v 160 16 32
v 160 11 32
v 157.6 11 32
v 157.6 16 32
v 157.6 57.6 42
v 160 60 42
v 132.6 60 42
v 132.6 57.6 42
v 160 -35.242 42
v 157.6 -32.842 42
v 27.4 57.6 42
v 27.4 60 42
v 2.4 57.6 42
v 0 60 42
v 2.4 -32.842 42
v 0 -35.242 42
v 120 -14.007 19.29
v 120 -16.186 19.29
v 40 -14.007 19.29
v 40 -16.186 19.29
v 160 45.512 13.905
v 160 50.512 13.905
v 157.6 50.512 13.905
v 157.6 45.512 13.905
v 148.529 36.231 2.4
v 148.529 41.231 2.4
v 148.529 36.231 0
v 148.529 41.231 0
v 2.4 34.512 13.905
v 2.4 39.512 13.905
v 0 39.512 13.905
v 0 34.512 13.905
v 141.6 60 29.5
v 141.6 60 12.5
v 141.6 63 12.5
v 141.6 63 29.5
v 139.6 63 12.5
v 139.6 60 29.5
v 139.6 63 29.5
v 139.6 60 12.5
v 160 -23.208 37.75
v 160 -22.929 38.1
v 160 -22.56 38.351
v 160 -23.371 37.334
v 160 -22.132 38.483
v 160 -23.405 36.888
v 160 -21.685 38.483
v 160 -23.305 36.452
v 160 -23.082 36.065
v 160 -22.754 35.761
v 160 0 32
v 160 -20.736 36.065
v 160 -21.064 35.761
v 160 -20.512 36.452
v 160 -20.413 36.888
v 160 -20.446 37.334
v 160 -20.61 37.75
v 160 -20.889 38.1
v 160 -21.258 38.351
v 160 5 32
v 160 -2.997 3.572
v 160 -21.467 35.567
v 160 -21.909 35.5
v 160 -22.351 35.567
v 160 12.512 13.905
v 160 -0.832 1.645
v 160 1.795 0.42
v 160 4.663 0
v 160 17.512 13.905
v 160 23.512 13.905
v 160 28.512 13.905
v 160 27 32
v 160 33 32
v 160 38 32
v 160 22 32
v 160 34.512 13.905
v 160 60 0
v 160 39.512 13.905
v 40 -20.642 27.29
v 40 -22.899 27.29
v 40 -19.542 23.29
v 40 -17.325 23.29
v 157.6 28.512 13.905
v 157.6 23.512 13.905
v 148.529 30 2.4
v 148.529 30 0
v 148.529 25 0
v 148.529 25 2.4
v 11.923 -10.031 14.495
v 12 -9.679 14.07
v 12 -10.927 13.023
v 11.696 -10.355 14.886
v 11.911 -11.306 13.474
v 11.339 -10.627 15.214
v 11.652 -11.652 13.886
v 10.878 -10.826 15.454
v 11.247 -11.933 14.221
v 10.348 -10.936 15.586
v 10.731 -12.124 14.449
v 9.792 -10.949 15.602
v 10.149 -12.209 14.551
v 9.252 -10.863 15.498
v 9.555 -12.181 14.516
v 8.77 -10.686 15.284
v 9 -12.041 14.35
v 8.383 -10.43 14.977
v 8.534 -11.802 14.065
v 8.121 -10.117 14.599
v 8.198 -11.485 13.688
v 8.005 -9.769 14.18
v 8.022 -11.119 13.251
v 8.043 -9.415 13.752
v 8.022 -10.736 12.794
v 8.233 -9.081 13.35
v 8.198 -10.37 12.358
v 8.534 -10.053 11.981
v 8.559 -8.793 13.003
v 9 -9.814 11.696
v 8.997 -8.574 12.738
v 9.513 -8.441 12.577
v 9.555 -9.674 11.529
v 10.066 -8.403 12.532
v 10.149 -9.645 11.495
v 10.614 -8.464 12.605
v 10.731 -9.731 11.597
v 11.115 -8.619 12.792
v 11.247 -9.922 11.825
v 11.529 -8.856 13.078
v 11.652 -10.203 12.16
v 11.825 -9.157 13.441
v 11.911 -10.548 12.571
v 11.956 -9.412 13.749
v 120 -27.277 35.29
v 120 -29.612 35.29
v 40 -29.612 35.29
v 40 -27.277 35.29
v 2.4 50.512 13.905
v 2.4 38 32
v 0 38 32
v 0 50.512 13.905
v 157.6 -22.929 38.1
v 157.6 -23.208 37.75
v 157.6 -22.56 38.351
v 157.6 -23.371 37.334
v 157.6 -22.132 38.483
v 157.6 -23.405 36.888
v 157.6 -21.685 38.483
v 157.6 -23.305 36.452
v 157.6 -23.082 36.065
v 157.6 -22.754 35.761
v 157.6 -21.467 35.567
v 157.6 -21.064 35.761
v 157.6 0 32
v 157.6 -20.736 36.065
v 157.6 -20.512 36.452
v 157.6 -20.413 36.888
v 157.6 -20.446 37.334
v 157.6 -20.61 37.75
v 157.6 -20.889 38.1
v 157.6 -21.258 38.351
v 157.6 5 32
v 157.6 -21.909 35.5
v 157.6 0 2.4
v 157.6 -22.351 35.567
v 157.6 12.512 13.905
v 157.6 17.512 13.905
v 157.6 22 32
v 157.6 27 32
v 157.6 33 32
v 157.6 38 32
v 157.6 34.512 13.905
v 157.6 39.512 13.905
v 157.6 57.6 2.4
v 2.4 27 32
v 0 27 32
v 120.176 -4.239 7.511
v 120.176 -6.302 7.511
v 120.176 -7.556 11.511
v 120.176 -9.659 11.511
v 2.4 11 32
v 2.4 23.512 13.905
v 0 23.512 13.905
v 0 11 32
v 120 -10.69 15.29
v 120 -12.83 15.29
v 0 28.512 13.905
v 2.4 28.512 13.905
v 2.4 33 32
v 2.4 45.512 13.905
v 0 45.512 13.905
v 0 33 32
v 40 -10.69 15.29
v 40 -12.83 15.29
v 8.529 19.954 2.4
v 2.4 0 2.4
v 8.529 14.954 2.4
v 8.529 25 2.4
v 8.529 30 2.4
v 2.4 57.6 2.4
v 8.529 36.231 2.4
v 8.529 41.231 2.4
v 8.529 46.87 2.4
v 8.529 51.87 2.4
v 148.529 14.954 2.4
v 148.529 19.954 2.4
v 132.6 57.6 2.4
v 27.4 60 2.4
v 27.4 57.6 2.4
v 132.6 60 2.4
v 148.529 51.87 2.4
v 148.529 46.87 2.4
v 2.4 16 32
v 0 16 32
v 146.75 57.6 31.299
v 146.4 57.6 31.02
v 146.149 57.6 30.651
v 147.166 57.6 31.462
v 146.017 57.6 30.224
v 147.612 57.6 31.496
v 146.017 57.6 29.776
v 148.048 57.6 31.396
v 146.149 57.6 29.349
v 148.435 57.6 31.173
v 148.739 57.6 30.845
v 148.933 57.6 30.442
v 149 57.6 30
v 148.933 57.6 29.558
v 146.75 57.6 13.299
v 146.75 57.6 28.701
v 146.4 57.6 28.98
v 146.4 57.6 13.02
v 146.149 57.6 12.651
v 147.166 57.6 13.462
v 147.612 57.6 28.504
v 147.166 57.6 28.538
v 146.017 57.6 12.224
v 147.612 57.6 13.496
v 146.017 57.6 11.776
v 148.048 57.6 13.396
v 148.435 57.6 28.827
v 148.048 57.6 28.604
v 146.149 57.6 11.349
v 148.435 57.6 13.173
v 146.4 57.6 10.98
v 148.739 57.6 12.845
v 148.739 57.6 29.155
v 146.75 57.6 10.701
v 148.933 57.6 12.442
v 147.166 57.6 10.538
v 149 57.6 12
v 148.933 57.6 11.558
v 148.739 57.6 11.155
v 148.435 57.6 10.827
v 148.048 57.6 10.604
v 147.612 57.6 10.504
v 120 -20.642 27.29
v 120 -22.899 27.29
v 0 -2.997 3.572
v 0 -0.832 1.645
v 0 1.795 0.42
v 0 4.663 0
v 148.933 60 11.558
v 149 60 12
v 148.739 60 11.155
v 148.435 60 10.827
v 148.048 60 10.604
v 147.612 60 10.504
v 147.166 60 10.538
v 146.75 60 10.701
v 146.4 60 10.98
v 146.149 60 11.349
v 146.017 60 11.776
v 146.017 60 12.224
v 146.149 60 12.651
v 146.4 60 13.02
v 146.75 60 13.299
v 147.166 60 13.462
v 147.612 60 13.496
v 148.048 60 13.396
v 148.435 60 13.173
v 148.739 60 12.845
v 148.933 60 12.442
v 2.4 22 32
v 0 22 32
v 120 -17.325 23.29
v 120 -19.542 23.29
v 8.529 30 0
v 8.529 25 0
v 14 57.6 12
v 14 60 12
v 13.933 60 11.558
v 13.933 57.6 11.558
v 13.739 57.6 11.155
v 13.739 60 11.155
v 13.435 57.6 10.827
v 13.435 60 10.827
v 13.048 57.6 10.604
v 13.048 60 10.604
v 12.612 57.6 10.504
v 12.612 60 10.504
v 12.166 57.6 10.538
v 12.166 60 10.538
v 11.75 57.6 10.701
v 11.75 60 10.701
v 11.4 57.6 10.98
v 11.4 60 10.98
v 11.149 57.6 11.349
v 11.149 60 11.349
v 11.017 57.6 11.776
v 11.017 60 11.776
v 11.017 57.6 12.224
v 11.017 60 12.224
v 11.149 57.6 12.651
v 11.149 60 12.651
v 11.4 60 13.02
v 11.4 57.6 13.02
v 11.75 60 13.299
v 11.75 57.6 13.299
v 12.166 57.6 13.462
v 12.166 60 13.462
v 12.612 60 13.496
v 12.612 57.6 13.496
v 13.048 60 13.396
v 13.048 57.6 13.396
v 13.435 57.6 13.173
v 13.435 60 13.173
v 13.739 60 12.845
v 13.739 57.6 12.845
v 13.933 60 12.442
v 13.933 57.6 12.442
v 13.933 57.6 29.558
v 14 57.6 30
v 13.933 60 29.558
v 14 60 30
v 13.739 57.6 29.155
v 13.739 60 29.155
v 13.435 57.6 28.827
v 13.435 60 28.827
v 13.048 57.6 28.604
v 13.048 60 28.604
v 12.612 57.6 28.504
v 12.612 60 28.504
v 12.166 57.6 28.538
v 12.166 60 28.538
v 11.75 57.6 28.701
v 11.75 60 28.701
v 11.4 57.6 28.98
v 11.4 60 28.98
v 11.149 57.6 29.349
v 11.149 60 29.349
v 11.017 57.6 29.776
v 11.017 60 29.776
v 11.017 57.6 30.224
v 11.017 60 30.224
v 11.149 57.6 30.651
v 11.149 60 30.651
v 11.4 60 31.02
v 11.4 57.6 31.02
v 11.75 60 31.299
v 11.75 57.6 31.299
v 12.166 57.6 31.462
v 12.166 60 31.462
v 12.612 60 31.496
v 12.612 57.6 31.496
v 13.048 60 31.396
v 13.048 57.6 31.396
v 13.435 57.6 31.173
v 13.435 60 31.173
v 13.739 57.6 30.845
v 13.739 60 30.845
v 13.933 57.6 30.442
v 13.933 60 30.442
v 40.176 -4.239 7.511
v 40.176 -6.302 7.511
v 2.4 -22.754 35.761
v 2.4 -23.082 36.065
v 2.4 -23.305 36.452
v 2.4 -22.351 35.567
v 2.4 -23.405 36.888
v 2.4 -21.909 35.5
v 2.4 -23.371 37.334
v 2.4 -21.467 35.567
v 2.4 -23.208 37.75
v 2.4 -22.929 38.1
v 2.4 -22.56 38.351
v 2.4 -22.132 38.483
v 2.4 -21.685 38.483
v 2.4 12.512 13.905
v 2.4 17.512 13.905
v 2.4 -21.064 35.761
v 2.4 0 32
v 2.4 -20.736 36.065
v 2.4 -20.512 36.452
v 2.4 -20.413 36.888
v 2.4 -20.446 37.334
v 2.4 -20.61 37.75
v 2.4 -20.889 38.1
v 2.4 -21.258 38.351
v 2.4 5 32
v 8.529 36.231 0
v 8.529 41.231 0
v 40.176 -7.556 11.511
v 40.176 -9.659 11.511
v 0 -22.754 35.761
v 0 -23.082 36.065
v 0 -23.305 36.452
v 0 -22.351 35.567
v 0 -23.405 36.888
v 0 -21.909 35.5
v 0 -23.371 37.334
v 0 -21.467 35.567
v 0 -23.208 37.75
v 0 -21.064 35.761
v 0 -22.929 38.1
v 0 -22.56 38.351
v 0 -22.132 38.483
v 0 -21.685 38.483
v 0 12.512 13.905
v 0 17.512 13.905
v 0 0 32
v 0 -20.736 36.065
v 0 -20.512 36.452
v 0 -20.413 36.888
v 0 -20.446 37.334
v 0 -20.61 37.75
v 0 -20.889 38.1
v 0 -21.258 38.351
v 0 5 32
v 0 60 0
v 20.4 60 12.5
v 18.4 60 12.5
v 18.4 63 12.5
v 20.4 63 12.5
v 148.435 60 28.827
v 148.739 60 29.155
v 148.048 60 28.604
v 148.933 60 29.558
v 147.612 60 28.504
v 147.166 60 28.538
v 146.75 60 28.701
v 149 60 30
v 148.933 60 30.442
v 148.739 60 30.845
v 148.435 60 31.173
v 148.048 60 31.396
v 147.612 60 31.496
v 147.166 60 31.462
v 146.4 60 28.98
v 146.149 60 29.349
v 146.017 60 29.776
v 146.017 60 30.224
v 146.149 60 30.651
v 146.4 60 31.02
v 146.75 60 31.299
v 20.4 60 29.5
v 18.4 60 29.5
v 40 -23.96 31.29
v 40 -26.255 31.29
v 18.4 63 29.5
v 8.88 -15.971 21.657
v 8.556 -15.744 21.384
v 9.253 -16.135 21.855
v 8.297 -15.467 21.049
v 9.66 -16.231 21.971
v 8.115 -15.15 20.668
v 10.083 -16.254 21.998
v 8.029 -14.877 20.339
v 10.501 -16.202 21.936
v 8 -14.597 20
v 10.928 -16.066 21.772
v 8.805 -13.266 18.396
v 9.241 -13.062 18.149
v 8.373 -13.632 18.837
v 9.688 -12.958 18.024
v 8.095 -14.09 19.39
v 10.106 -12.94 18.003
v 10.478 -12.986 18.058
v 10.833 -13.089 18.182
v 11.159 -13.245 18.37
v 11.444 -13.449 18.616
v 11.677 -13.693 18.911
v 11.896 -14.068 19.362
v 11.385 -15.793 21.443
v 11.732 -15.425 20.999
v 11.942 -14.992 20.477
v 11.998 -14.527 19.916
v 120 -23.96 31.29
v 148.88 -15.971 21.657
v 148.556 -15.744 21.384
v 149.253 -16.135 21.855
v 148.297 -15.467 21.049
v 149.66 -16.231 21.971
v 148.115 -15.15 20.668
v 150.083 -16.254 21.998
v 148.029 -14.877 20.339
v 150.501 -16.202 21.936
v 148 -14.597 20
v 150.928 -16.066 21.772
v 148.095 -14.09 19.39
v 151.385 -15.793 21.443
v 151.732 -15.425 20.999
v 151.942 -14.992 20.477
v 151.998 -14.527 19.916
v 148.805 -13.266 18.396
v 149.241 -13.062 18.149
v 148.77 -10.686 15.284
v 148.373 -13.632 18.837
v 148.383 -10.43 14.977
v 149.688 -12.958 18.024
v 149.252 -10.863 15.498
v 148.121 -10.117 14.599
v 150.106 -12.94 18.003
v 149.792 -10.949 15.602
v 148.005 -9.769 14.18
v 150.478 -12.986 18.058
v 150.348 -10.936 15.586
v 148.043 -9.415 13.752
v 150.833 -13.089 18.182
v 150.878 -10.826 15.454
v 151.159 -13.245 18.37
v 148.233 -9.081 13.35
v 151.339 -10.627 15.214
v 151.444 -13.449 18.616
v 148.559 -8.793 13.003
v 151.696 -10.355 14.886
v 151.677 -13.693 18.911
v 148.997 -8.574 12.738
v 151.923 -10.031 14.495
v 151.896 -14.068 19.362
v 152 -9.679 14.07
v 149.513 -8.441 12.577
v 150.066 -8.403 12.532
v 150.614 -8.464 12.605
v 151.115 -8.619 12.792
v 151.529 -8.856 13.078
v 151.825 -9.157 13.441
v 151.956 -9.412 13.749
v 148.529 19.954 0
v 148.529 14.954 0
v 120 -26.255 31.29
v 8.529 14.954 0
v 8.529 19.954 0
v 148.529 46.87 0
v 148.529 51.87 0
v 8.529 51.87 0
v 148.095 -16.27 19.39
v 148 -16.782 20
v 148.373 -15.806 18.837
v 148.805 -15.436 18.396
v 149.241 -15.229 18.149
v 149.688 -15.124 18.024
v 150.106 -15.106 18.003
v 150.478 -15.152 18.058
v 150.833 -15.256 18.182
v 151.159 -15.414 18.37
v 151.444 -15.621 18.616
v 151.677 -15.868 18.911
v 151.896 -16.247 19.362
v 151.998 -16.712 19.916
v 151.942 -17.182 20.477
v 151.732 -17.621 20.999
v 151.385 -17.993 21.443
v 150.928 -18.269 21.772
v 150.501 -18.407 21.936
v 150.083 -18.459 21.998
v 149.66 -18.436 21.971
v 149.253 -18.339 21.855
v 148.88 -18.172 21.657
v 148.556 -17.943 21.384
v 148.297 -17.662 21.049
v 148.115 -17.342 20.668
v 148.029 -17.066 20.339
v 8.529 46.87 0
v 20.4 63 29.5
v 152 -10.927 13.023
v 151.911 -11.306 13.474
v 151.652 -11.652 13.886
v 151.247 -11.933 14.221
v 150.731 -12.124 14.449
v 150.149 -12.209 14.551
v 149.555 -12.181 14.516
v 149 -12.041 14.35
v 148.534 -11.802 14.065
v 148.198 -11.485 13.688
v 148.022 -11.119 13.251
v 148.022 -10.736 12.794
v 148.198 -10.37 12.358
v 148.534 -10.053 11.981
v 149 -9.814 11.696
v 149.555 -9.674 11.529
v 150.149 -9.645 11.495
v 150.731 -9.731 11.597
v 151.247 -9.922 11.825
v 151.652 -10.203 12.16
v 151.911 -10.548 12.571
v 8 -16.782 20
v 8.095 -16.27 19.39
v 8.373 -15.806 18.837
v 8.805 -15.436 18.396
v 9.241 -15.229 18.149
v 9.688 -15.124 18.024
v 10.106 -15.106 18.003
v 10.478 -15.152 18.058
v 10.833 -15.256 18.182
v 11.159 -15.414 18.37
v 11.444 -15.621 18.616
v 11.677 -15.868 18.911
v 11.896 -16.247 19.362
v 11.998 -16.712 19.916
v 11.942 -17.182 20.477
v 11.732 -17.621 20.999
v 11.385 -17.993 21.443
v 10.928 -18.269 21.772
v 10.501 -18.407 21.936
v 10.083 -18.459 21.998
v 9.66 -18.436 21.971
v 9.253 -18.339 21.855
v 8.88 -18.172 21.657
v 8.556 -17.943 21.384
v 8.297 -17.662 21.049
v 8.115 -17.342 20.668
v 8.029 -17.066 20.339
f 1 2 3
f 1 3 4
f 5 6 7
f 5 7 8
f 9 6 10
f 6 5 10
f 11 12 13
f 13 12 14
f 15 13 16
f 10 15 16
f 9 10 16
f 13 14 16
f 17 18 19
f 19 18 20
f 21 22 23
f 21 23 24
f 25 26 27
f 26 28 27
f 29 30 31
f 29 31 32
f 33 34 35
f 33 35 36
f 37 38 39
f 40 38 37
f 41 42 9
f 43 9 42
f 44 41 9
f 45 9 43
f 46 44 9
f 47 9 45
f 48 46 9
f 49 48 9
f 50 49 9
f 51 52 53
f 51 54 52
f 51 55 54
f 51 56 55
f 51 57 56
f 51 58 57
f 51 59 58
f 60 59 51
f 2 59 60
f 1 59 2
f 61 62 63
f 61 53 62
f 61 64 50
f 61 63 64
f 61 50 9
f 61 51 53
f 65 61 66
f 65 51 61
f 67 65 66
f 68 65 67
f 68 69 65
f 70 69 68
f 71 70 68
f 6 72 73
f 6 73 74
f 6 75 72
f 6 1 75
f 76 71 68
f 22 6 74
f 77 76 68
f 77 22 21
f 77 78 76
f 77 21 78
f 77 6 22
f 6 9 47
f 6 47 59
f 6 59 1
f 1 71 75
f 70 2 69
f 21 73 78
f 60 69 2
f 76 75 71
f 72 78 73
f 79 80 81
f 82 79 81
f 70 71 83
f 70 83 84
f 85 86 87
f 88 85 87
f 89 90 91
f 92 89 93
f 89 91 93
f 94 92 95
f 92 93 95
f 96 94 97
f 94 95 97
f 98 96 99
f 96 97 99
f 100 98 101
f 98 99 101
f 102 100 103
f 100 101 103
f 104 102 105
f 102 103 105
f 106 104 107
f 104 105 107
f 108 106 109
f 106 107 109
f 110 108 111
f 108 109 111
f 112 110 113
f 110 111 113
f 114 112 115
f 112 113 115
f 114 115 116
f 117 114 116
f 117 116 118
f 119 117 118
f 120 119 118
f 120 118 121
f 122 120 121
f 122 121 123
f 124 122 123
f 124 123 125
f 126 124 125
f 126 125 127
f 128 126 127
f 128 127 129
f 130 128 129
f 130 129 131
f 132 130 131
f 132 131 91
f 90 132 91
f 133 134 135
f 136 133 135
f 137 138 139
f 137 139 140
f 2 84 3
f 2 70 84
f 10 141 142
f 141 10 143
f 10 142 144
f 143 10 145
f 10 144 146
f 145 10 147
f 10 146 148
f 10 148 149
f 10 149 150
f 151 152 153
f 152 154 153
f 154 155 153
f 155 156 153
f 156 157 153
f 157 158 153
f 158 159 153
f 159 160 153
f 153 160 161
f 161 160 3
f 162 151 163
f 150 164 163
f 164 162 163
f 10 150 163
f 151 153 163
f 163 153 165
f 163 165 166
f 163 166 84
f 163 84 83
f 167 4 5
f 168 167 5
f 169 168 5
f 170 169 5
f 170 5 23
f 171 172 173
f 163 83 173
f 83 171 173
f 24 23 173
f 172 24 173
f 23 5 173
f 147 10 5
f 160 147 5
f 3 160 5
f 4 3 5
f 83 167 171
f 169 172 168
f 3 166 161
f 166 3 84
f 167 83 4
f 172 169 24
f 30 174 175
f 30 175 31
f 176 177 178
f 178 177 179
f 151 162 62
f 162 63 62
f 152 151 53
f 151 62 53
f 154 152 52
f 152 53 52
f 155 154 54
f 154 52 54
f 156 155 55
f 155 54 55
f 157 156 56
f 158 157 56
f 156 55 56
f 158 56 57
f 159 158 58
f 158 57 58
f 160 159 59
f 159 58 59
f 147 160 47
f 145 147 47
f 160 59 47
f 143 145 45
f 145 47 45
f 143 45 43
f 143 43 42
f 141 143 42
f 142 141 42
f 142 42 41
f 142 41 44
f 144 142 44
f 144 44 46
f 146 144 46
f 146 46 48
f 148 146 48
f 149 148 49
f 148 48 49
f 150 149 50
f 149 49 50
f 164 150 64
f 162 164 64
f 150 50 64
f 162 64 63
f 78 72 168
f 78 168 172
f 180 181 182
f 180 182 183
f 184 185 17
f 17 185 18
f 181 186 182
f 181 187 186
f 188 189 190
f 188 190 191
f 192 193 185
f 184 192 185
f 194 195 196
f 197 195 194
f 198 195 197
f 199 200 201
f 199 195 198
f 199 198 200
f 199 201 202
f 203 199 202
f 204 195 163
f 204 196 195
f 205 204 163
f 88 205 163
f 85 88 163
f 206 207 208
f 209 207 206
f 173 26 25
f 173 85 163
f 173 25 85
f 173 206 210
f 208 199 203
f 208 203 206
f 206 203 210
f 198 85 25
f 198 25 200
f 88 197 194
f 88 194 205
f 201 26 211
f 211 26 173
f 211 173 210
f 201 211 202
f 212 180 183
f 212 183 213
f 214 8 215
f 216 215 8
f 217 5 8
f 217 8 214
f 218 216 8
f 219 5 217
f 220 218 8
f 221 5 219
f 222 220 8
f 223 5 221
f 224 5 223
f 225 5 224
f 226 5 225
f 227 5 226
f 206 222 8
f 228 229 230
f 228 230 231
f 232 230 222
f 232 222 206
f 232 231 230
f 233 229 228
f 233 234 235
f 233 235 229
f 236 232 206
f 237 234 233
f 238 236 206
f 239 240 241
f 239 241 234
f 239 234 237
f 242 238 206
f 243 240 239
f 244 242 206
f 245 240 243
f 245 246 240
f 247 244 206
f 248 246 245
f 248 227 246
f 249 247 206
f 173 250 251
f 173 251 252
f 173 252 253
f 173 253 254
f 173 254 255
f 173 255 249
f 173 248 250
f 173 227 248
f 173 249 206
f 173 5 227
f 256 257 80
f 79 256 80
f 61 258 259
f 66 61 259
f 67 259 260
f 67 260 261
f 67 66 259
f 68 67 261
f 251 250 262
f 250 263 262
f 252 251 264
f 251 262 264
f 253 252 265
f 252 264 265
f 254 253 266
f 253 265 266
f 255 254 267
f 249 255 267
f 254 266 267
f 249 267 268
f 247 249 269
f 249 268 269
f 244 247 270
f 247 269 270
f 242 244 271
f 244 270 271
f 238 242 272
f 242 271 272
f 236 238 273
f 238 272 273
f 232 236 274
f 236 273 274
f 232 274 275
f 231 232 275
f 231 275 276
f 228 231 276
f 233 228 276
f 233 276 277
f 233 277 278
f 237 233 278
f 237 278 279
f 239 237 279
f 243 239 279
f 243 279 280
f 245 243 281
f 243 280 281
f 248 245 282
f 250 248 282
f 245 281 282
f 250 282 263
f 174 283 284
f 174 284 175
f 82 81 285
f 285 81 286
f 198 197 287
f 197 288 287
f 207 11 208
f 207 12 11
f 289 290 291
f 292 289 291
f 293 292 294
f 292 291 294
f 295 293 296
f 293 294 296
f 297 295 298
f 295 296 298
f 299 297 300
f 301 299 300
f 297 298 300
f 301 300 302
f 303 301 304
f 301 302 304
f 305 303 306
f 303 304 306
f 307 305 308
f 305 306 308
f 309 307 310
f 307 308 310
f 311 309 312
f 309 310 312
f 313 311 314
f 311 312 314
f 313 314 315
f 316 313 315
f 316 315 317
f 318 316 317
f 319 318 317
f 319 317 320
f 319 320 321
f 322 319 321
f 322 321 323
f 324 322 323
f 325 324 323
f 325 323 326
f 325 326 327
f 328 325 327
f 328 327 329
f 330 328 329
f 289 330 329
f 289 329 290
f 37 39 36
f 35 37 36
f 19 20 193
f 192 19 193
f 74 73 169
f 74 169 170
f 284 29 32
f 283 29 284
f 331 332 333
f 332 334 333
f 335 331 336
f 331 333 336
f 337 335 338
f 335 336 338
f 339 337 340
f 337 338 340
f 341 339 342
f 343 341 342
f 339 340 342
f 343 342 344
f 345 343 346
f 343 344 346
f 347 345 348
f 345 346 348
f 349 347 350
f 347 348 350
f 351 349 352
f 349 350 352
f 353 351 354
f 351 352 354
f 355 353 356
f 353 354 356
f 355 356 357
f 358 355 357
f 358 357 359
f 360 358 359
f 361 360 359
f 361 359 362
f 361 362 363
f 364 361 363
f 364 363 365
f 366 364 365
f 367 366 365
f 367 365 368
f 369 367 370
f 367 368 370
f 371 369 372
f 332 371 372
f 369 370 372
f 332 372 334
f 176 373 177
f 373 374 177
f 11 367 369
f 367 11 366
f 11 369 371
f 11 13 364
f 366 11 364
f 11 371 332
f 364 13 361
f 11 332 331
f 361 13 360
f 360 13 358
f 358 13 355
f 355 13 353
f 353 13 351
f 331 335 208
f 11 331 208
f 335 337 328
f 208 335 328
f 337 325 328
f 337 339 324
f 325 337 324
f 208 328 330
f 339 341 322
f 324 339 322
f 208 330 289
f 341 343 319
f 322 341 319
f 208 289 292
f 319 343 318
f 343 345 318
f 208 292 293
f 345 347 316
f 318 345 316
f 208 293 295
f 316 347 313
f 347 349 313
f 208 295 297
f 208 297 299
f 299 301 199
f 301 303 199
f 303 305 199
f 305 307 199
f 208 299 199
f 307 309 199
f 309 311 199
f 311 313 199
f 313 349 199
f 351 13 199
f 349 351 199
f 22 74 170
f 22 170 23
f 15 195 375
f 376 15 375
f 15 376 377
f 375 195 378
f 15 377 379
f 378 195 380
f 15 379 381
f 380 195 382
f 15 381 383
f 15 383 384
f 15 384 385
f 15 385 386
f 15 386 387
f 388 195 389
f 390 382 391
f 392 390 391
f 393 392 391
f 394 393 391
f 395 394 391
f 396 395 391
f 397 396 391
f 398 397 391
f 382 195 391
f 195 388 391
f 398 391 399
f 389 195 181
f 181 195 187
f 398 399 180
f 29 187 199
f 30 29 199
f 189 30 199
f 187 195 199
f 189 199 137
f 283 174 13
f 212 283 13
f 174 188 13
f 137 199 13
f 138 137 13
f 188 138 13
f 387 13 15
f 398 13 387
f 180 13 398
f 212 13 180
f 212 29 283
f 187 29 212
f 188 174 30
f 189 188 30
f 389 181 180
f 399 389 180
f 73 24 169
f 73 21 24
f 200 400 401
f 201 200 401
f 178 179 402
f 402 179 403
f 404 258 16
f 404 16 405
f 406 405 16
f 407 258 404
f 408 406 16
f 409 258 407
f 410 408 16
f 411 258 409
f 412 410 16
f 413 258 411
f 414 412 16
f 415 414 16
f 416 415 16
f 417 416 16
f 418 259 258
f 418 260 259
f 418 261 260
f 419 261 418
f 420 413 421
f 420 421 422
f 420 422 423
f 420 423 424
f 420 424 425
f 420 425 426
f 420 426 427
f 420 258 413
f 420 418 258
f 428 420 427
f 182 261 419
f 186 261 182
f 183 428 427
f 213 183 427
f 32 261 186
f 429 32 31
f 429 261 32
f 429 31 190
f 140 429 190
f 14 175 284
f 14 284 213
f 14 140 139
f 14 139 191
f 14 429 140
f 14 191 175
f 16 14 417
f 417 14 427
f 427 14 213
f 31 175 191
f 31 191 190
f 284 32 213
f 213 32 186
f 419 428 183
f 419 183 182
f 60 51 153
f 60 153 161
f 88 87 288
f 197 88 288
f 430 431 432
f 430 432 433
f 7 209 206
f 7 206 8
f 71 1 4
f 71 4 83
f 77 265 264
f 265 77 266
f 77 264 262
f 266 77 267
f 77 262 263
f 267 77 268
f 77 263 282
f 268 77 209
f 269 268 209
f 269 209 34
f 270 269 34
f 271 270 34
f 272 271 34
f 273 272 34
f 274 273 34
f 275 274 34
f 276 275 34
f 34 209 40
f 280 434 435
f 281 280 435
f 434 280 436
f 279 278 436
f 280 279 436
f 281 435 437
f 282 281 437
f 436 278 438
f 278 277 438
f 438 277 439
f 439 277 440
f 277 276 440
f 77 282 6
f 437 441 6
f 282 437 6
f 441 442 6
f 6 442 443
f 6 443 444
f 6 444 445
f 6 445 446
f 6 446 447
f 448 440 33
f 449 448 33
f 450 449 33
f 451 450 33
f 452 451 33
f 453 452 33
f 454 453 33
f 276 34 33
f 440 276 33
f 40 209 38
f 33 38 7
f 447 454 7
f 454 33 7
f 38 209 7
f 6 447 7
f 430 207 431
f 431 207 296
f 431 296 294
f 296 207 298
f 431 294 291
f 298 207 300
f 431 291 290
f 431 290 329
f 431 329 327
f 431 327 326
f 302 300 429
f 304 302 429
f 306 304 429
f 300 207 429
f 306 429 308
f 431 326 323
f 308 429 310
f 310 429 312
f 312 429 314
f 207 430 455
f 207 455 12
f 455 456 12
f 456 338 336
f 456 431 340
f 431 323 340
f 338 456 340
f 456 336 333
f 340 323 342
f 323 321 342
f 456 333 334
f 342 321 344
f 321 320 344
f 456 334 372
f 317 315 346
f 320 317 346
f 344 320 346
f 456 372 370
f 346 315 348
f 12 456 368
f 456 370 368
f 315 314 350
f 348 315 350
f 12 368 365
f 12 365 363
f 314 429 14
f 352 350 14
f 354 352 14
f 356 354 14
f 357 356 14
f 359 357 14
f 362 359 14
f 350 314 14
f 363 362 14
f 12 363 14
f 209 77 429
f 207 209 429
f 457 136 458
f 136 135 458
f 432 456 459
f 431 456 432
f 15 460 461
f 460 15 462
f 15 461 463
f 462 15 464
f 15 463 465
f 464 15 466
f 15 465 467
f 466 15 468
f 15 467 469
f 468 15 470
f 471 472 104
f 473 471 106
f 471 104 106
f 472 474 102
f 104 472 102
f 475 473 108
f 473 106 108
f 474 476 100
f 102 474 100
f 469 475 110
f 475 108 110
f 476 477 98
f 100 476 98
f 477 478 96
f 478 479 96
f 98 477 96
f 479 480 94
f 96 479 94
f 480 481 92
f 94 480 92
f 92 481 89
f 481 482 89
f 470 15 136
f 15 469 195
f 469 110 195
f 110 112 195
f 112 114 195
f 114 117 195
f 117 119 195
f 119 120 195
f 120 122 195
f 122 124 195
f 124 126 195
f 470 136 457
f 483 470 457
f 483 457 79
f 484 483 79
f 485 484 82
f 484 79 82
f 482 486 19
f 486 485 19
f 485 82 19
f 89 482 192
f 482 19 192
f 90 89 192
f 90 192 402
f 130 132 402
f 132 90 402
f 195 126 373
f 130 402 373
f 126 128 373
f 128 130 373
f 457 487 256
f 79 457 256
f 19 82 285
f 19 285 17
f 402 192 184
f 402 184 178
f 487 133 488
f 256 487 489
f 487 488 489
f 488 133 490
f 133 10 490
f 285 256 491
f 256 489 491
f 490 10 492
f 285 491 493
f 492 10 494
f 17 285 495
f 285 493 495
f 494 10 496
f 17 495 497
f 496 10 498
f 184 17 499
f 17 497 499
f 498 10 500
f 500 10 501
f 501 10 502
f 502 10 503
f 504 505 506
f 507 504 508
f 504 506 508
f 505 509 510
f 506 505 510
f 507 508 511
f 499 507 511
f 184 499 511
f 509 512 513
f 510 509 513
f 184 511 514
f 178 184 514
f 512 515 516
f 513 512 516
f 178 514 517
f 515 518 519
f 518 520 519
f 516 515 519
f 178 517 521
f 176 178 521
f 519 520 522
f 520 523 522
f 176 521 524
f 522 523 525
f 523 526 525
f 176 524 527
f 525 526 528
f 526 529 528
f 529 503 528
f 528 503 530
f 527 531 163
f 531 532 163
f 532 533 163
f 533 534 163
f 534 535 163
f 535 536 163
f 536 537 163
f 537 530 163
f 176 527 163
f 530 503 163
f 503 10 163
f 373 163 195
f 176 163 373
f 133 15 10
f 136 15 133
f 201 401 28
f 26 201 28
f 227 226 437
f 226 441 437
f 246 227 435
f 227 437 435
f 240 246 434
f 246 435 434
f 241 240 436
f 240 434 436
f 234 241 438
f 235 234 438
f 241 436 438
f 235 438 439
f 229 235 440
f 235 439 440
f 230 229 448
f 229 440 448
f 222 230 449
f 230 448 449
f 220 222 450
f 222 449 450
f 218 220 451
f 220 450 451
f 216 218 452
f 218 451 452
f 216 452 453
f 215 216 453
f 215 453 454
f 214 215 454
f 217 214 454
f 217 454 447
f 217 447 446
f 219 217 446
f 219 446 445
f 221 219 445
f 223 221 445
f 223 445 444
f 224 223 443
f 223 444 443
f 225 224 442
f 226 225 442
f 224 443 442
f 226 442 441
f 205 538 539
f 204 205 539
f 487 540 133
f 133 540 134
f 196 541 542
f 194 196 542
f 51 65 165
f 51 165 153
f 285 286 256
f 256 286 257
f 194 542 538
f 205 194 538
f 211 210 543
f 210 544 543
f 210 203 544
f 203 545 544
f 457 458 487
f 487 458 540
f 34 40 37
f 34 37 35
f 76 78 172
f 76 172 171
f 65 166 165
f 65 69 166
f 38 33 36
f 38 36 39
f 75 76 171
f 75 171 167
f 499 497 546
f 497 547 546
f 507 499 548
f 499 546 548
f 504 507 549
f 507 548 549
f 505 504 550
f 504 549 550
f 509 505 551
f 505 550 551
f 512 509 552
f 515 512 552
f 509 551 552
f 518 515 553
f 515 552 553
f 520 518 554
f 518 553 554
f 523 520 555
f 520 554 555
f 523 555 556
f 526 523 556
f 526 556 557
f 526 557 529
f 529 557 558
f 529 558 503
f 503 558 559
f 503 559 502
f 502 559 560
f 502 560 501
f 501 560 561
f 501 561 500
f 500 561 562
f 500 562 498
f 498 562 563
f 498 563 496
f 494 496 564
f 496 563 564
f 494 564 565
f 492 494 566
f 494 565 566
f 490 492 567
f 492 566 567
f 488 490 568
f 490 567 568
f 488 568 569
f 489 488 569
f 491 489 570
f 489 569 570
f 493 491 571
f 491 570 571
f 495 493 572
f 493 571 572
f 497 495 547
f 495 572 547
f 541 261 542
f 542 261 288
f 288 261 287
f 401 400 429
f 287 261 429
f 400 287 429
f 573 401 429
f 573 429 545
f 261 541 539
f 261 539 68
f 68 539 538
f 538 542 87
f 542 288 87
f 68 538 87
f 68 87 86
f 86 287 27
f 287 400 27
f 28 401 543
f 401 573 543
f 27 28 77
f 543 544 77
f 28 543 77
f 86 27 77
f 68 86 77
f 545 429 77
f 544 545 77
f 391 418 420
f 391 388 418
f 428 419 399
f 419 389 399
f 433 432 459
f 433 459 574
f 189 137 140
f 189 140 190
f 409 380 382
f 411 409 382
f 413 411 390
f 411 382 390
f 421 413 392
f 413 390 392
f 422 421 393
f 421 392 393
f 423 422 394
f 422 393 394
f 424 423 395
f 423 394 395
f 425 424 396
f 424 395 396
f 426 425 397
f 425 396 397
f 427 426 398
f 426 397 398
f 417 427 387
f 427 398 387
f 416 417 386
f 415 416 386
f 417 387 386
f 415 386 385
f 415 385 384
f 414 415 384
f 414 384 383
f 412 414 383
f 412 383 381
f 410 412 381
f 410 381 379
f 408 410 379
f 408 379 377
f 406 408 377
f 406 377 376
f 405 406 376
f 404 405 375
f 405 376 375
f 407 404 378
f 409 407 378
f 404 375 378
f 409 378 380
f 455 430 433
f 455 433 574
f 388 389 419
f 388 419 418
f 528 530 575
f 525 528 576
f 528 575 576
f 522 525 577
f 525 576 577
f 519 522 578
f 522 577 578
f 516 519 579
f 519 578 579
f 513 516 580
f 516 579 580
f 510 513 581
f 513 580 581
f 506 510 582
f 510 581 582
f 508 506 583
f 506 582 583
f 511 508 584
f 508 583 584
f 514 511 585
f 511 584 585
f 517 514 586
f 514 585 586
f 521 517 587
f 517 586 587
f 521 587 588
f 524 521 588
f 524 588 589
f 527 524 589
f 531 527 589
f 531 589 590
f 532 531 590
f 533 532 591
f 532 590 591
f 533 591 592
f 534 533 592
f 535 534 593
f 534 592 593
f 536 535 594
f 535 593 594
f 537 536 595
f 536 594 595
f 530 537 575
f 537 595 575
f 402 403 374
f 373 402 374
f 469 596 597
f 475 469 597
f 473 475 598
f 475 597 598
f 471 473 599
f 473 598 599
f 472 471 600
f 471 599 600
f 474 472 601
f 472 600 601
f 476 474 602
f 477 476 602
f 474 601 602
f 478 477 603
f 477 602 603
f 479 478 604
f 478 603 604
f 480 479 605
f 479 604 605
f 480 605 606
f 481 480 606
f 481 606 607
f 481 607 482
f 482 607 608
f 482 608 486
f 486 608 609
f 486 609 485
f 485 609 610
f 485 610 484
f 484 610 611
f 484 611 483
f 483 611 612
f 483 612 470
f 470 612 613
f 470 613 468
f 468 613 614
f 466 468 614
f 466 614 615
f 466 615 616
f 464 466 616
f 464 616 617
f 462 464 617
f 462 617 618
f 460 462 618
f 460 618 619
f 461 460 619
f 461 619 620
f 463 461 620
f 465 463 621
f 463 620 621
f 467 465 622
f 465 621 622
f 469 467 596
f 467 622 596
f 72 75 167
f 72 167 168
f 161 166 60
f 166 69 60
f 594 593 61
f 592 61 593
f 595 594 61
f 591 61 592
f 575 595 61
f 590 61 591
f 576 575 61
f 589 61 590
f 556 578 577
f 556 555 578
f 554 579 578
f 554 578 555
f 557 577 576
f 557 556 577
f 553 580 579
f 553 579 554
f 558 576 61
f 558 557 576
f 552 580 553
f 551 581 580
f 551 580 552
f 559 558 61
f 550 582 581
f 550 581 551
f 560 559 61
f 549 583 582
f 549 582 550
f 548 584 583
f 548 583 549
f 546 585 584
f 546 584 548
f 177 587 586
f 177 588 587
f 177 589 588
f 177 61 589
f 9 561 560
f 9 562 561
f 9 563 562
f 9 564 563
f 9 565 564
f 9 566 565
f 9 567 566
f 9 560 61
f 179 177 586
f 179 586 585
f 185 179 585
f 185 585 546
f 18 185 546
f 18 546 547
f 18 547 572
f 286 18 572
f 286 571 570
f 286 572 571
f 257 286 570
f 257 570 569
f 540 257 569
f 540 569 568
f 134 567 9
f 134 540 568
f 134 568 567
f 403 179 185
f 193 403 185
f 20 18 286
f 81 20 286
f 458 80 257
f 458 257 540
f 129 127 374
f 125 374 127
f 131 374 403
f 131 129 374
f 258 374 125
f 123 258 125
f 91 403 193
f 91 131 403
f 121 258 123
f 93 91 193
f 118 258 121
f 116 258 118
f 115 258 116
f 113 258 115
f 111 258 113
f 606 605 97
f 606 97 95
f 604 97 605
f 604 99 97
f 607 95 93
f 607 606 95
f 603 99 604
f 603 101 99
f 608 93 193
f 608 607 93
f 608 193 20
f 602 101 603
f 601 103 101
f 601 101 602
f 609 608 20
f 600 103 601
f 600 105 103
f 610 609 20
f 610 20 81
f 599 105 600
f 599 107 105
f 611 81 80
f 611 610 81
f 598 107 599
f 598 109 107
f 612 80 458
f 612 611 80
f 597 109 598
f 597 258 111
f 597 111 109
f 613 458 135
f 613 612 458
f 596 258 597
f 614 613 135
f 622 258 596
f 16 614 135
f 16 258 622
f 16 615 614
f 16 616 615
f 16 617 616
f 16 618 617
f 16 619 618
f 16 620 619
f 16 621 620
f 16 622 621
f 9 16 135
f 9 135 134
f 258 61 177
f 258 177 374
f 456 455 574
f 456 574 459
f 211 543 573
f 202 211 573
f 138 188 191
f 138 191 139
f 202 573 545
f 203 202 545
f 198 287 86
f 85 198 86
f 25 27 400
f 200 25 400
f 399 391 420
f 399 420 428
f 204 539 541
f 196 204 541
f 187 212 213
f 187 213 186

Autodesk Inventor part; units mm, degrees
ref_plane "YZ Plane" through (0, 0, 0) normal (1, 0, 0) x (0, 1, 0)
ref_plane "XY Plane" through (0, 0, 0) normal (0, 0, 1) x (1, 0, 0)
sketch "Sketch1" plane through (0, 0, 0) normal (0, 0, 1) x (1, 0, 0)
  line L0 (0, 0) -> (160, 0)
  line L1 (160, 0) -> (160, 60)
  line L2 (160, 60) -> (0, 60)
  line L3 (0, 60) -> (0, 0)
  line L4 (8.5291, 51.8697) -> (148.5291, 51.8697)
  line L5 (148.5291, 51.8697) -> (148.5291, 46.8697)
  line L6 (148.5291, 46.8697) -> (8.5291, 46.8697)
  line L7 (8.5291, 46.8697) -> (8.5291, 51.8697)
  line L8 (8.5291, 41.2311) -> (148.5291, 41.2311)
  line L9 (148.5291, 41.2311) -> (148.5291, 36.2311)
  line L10 (148.5291, 36.2311) -> (8.5291, 36.2311)
  line L11 (8.5291, 36.2311) -> (8.5291, 41.2311)
  line L12 (8.5291, 30) -> (148.5291, 30)
  line L13 (148.5291, 30) -> (148.5291, 25)
  line L14 (148.5291, 25) -> (8.5291, 25)
  line L15 (8.5291, 25) -> (8.5291, 30)
  line L16 (8.5291, 19.9539) -> (148.5291, 19.9539)
  line L17 (148.5291, 19.9539) -> (148.5291, 14.9539)
  line L18 (148.5291, 14.9539) -> (8.5291, 14.9539)
  line L19 (8.5291, 14.9539) -> (8.5291, 19.9539)
  dimension "d0" = 160
  dimension "d1" = 60
  dimension "d2" = 140
  dimension "d3" = 5
  dimension "d4" = 5
  dimension "d5" = 5
  dimension "d6" = 5
extrude "Extrusion1" add sketch "Sketch1" along normal blind 2.4
sketch "Sketch2" plane through (0, 0, 2.4) normal (0, 0, 1) x (1, 0, 0)
  line L0 (0, 60) -> (0, 0) projected
  line L1 (0, 0) -> (160, 0) projected
  line L2 (0, 60) -> (2.4, 60)
  line L3 (2.4, 60) -> (2.4, 0)
  line L4 (2.4, 0) -> (0, 0)
  line L5 (0, 0) -> (0, 60)
  line L6 (160, 60) -> (0, 60) projected
  line L7 (160, 0) -> (157.6, 0)
  line L8 (157.6, 0) -> (157.6, 60)
  line L9 (157.6, 60) -> (160, 60)
  line L10 (160, 60) -> (160, 0)
  dimension "d9" = 2.4
  dimension "d10" = 2.4
extrude "Extrusion2" add sketch "Sketch2" along normal blind 39.6 contours L2 L3 L1 L0 | L6 L10 L1 L8
sketch "Sketch3" plane through (160, 0, 0) normal (1, 0, 0) x (0, 0, -1)
  line L0 (0, 0) -> (-42, -35.2422)
  line L1 (0, 0) -> (54.8271, 0) construction
  line L2 (-42, 0) -> (-42, 60) projected
  line L3 (-42, -35.2422) -> (-42, 0)
  line L4 (-42, 0) -> (0, 0)
  dimension "d13" = 140
extrude "Extrusion3" add sketch "Sketch3" against normal blind 2.4
sketch "Sketch4" plane through (0, 0, 0) normal (-1, 0, 0) x (0, 0, 1)
  line L0 (0, 0) -> (42, 0) projected
  line L1 (42, 0) -> (0, 0)
  line L2 (0, 0) -> (42, -35.2422) projected
  line L3 (0, 0) -> (42, -35.2422)
  line L4 (42, -35.2422) -> (42, 0)
extrude "Extrusion4" add sketch "Sketch4" against normal blind 2.4
sketch "Sketch5" plane through (157.6, 0, 2.4) normal (-1, 0, 0) x (0, 0, 1)
  line L0 (-2.4, 0) -> (0, 0)
  line L1 (39.6, 60) -> (39.6, -35.2422) projected
  line L2 (39.6, -35.2422) -> (39.6, -32.8422)
  line L3 (39.6, -32.8422) -> (0, 0)
  line L4 (-2.4, 0) -> (39.6, -35.2422)
  dimension "d18" = 2.4
extrude "Extrusion5" add sketch "Sketch5" along normal blind 157.6
sketch "Sketch6" plane through (160, 60, 42) normal (1, 0, 0) x (0, 0, -1)
  line L0 (10, -60) -> (10, -55)
  line L1 (10, -49) -> (10, -44)
  line L2 (10, -38) -> (10, -33)
  line L3 (10, -27) -> (10, -22)
  line L4 (10, -22) -> (28.0953, -9.4875)
  line L5 (28.0953, -9.4875) -> (28.0953, -14.4875)
  line L6 (42, 0) -> (0, 0) projected
  line L7 (28.0953, -20.4875) -> (28.0953, -25.4875)
  line L8 (28.0953, -31.4875) -> (28.0953, -36.4875)
  line L9 (28.0953, -42.4875) -> (28.0953, -47.4875)
  line L10 (28.0953, -47.4875) -> (10, -60)
  line L11 (28.0953, -42.4875) -> (10, -55)
  line L12 (28.0953, -36.4875) -> (10, -49)
  line L13 (10, -44) -> (28.0953, -31.4875)
  line L14 (28.0953, -25.4875) -> (10, -38)
  line L15 (10, -33) -> (28.0953, -20.4875)
  line L16 (28.0953, -14.4875) -> (10, -27)
  line L17 (0, -95.2422) -> (0, 0) projected
  circle A0 centre (5, -81.9088) radius 1.5
  line L18 (42, -60) -> (0, -95.2422) projected
  dimension "d21" = 5
  dimension "d22" = 6
  dimension "d23" = 5
  dimension "d24" = 6
  dimension "d25" = 5
  dimension "d26" = 6
  dimension "d27" = 5
  dimension "d28" = 22
  dimension "d29" = 5
  dimension "d30" = 6
  dimension "d31" = 5
  dimension "d32" = 6
  dimension "d33" = 5
  dimension "d34" = 6
  dimension "d35" = 5
  dimension "d36" = 10
  dimension "d77" = 3
  dimension "d78" = 7
  dimension "d79" = 5
ref_plane "Work Plane1" through (0, -50, 0) normal (0, 1, 0) x (-1, 0, 0)
sketch "Sketch7" plane through (0, -50, 0) normal (0, 1, 0) x (-1, 0, 0)
  circle A0 centre (-10, 20) radius 2
  line L0 (-157.6, 42) -> (-2.4, 42) projected
  line L1 (-80, 42) -> (-80, 0)
  line L2 (-8.5291, 0) -> (-148.5291, 0) projected
  circle A1 centre (-150, 20) radius 2
  line L3 (-160, 0) -> (-160, 42) projected
  line L4 (0, 0) -> (0, 42) projected
  line L5 (0, 0) -> (-160, 0) projected
  line L6 (-80, 35.2897) -> (-40, 35.2897)
  line L7 (-40, 35.2897) -> (-40, 31.2897)
  line L8 (-40, 31.2897) -> (-120, 31.2897)
  line L9 (-120, 31.2897) -> (-120, 35.2897)
  line L10 (-120, 35.2897) -> (-80, 35.2897)
  line L11 (-39.9996, 27.2897) -> (-39.9998, 23.2897)
  line L12 (-40, 19.2897) -> (-40, 15.2897)
  line L13 (-40, 15.2897) -> (-120, 15.2897)
  line L14 (-120, 15.2897) -> (-120, 19.2897)
  line L15 (-120, 19.2897) -> (-40, 19.2897)
  line L16 (-39.9998, 23.2897) -> (-120, 23.2897)
  line L17 (-120, 23.2897) -> (-120, 27.2897)
  line L18 (-120, 27.2897) -> (-39.9996, 27.2897)
  line L19 (-40.1762, 11.5108) -> (-40.1762, 7.5108)
  line L20 (-40.1762, 7.5108) -> (-120.1762, 7.5108)
  line L21 (-120.1762, 7.5108) -> (-120.1762, 11.5108)
  line L22 (-120.1762, 11.5108) -> (-40.1762, 11.5108)
  dimension "d40" = 4
  dimension "d41" = 4
  dimension "d42" = 10
  dimension "d43" = 10
  dimension "d44" = 20
  dimension "d45" = 20
  dimension "d46" = 40
  dimension "d47" = 4
  dimension "d49" = 4
  dimension "d50" = 4
  dimension "d51" = 4
  dimension "d52" = 4
  dimension "d55" = 4
  dimension "d56" = 80
  dimension "d57" = 80
  dimension "d58" = 80
  dimension "d59" = 80.0002
  dimension "d60" = 80
extrude "Extrusion8" cut sketch "Sketch7" along normal blind 160
sketch "Sketch8" plane through (0, -35.2422, 42) normal (0, -0.766, -0.6428) x (1, 0, 0)
  circle A0 centre (10, -37.8271) radius 2
  line L0 (0, -54.8271) -> (0, 0) projected
  circle A1 centre (150, -37.8271) radius 2
  line L1 (160, -54.8271) -> (160, 0) projected
  line L2 (0, -54.8271) -> (160, -54.8271) projected
  dimension "d63" = 4
  dimension "d64" = 10
  dimension "d65" = 4
  dimension "d66" = 10
  dimension "d67" = 17
  dimension "d68" = 17
extrude "Extrusion9" cut sketch "Sketch8" against normal blind 160
sketch "Sketch9" plane through (157.6, 60, 2.4) normal (-1, 0, 0) x (0, 0, 1)
  line L0 (39.6, 0) -> (39.6, -92.8422) projected
  line L1 (0, 0) -> (39.6, 0)
  line L2 (39.6, 0) -> (39.6, -2.4)
  line L3 (39.6, -2.4) -> (0, -2.4)
  line L4 (0, -2.4) -> (0, 0)
  point P0 (-2.4, -60)
  dimension "d71" = 2.4
extrude "Extrusion10" add sketch "Sketch9" along normal blind 25
sketch "Sketch10" plane through (2.4, 60, 42) normal (1, 0, 0) x (0, 0, -1)
  line L0 (39.6, 0) -> (0, 0) projected
  line L1 (0, 0) -> (0, -92.8422) projected
  line L2 (39.6, 0) -> (0, 0)
  line L3 (0, 0) -> (0, -2.4)
  line L4 (0, -2.4) -> (39.6, -2.4)
  line L5 (39.6, -2.4) -> (39.6, 0)
  point P0 (42, -60)
  dimension "d74" = 2.4
extrude "Extrusion11" add sketch "Sketch10" along normal blind 25
extrude "Extrusion12" cut sketch "Sketch6" against normal blind 160
sketch "Sketch11" plane through (0, 60, 0) normal (0, 1, 0) x (1, 0, 0)
  circle A0 centre (147.5, -30) radius 1.5
  line L0 (160, 0) -> (160, -42) projected
  line L1 (160, -42) -> (132.6, -42) projected
  circle A1 centre (147.5, -12) radius 1.5
  line L2 (160, 0) -> (0, 0) projected
  circle A2 centre (12.5, -30) radius 1.5
  circle A3 centre (12.5, -12) radius 1.5
  line L3 (0, 0) -> (0, -42) projected
  line L4 (0, -42) -> (27.4, -42) projected
  line L5 (141.6, -29.5) -> (139.6, -29.5)
  line L6 (139.6, -29.5) -> (139.6, -12.5)
  line L7 (139.6, -12.5) -> (141.6, -12.5)
  line L8 (141.6, -12.5) -> (141.6, -29.5)
  line L9 (132.6, -42) -> (132.6, -2.4) projected
  line L10 (20.4, -29.5) -> (18.4, -29.5)
  line L11 (18.4, -29.5) -> (18.4, -12.5)
  line L12 (18.4, -12.5) -> (20.4, -12.5)
  line L13 (20.4, -12.5) -> (20.4, -29.5)
  line L14 (27.4, -2.4) -> (27.4, -42) projected
  dimension "d82" = 3
  dimension "d83" = 12.5
  dimension "d84" = 12
  dimension "d85" = 3
  dimension "d86" = 12.5
  dimension "d87" = 12
  dimension "d88" = 3
  dimension "d89" = 3
  dimension "d90" = 12.5
  dimension "d91" = 12
  dimension "d92" = 12
  dimension "d93" = 12.5
  dimension "d96" = 7
  dimension "d97" = 2
  dimension "d98" = 12.5
  dimension "d99" = 12.5
  dimension "d101" = 2
  dimension "d103" = 7
  dimension "d104" = 12.5
  dimension "d107" = 12.5
extrude "Extrusion13" cut sketch "Sketch11" against normal blind 12 contours A0 | A1 | A2 | A3
extrude "Extrusion14" add sketch "Sketch11" along normal blind 3 contours L5 L6 L7 L8 | L10 L11 L12 L13
fillet "Fillet1" radius 10 1 edges at (80, 0, 0)
equation "\"d42\" = d43"
equation "\"d45\" = d44"
equation "\"d66\" = d64"
equation "\"d68\" = d67"
equation "\"d86\" = d83"
equation "\"d87\" = d84"
equation "\"d90\" = d86"
equation "\"d91\" = d87"
equation "\"d92\" = d84"
equation "\"d93\" = d83"
equation "\"d103\" = d96"
equation "\"d104\" = d99"
equation "\"d107\" = d98"
properties part number "Chassi_Front"
